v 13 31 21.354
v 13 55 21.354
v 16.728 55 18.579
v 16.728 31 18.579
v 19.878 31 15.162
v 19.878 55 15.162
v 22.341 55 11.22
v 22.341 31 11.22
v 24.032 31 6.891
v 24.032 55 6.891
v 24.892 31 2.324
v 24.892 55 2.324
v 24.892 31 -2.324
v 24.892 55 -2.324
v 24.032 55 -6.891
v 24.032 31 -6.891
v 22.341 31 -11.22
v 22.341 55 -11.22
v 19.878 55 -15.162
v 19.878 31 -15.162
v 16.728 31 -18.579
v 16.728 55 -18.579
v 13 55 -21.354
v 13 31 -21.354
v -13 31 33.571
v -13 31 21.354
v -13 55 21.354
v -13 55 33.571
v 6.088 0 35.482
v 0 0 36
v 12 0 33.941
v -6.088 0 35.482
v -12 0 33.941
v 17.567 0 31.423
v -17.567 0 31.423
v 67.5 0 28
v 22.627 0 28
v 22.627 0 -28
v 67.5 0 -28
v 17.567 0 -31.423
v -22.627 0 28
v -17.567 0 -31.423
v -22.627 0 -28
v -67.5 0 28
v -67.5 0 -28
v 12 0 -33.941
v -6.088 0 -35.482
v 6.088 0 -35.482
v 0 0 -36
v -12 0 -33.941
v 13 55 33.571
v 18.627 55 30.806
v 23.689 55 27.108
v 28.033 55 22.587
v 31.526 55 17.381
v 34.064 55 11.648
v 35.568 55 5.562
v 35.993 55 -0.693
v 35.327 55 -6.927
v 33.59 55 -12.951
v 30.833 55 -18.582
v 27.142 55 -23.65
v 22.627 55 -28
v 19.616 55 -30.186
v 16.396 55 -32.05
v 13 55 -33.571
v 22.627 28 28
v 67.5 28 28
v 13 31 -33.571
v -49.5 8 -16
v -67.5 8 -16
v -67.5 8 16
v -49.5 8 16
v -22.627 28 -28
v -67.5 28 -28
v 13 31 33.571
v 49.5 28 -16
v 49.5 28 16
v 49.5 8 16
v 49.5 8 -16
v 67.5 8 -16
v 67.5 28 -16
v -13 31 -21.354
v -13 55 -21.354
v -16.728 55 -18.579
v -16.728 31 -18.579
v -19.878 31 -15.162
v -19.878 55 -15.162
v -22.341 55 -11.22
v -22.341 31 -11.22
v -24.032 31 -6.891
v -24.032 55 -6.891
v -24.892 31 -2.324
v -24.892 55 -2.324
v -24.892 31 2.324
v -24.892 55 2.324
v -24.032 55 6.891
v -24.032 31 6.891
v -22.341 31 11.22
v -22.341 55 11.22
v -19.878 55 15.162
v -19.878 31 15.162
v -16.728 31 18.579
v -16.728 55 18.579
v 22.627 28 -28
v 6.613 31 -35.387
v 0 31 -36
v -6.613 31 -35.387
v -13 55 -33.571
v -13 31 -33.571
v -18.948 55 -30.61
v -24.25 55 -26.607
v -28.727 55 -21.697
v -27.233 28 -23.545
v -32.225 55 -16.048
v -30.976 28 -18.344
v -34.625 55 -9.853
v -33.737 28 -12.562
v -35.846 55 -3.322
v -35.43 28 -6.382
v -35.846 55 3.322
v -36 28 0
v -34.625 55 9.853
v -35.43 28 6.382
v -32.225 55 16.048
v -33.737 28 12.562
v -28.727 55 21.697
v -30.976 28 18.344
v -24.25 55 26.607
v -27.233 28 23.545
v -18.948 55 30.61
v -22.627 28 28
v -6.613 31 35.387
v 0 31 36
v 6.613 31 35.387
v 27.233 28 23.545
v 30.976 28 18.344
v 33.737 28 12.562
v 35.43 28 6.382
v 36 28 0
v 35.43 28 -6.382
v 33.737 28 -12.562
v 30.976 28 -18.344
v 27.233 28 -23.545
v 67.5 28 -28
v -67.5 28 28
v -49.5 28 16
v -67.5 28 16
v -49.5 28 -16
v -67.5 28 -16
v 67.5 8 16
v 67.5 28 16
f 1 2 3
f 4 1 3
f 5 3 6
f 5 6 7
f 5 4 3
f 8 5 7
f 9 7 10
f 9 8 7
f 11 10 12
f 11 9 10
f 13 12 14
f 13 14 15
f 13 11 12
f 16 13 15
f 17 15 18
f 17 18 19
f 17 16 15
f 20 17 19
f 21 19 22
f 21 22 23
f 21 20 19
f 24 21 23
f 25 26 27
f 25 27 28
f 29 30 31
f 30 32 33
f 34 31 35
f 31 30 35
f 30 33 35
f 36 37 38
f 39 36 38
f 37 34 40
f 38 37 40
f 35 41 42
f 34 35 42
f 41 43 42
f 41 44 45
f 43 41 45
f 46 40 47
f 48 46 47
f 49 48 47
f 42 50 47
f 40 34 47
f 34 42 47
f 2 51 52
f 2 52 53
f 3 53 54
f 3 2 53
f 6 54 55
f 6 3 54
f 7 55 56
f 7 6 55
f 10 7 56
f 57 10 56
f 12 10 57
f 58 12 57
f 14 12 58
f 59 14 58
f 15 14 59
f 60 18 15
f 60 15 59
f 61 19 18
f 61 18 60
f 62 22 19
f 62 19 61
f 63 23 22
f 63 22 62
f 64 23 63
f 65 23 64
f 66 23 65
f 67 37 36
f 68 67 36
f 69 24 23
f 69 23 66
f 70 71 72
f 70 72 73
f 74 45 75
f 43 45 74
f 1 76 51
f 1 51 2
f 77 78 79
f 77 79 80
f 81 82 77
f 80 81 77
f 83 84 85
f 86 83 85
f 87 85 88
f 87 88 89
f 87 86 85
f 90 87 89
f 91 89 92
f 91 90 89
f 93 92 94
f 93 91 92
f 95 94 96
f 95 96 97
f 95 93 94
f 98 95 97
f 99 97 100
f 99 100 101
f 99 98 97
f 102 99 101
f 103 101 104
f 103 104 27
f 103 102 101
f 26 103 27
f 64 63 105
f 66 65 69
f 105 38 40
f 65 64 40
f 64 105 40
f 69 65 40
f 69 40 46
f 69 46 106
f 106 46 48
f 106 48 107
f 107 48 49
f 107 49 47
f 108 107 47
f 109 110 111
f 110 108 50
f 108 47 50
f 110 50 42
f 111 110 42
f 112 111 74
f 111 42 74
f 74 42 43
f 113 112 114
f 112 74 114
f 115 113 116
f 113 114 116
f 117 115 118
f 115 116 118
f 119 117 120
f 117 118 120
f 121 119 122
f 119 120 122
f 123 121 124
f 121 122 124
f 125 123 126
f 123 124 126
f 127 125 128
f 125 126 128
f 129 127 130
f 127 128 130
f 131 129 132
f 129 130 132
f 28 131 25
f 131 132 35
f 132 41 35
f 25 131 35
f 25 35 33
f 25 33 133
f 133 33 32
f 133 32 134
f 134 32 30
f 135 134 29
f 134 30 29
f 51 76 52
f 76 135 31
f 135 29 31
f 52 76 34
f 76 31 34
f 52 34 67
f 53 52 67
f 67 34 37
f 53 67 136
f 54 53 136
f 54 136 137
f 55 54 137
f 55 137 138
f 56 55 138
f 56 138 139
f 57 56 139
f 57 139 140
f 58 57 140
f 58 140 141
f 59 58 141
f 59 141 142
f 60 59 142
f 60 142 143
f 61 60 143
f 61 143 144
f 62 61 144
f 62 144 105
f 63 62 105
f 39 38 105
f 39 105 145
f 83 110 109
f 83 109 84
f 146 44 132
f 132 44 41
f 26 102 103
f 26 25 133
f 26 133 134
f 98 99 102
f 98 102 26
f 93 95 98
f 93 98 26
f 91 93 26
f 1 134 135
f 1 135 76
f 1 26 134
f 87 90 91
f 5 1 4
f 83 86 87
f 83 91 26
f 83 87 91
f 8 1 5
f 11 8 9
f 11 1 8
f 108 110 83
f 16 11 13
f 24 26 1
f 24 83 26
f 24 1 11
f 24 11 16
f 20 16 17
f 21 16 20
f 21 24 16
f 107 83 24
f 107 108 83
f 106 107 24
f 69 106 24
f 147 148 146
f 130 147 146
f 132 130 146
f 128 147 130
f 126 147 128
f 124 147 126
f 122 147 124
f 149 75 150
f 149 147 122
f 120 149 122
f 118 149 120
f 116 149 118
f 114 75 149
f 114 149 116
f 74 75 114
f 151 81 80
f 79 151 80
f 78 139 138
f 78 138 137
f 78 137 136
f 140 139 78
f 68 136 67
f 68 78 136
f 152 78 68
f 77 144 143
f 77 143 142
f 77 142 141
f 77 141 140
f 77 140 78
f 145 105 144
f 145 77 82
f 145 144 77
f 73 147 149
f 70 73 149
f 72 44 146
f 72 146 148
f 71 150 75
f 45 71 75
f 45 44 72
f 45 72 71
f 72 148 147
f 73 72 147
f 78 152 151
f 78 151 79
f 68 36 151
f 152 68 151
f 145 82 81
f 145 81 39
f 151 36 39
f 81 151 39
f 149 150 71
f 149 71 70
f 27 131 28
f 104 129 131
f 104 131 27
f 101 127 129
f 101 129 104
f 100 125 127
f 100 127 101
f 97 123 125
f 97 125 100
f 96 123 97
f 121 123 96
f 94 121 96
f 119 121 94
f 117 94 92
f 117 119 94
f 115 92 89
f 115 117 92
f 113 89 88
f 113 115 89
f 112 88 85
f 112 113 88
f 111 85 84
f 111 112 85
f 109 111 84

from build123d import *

# Parameters (mm, degrees)
SKETCH1_W           = 135
SKETCH1_H           = 56
BOSS_EXTRUDE1_DEPTH = 28
SKETCH2_R           = 36
BOSS_EXTRUDE2_DEPTH = 55
SKETCH3_W           = 18
SKETCH3_H           = 32
CUT_EXTRUDE1_DEPTH  = 20
CUT_EXTRUDE2_START  = -24
CUT_EXTRUDE2_DEPTH  = 24


with BuildPart() as part:
    # Sketch1 → Boss-Extrude1 (new body)
    with BuildSketch(Plane(origin=(0, 0, 0), x_dir=(1, 0, 0), z_dir=(0, 1, 0))):
        Rectangle(SKETCH1_W, SKETCH1_H)
    extrude(amount=BOSS_EXTRUDE1_DEPTH)

    # Sketch2 → Boss-Extrude2 (add)
    with BuildSketch(Plane(origin=(0, 0, 0), x_dir=(1, 0, 0), z_dir=(0, 1, 0))):
        with Locations(Location((0, 0, 0), (0, 0, 51.057558731))):
            Circle(SKETCH2_R)
    extrude(amount=BOSS_EXTRUDE2_DEPTH)

    # Sketch3 → Cut-Extrude1 (cut)
    with BuildSketch(Plane(origin=(0, 28, 0), x_dir=(1, 0, 0), z_dir=(0, 1, 0))):
        with Locations((-58.5, 0)):
            Rectangle(SKETCH3_W, SKETCH3_H)
    cut_extrude1 = extrude(amount=-CUT_EXTRUDE1_DEPTH, mode=Mode.SUBTRACT)

    # Mirror1: Cut-Extrude1 across plane
    add(cut_extrude1.mirror(Plane(origin=(0, 0, 0), x_dir=(0, 0, 1), z_dir=(1, 0, 0))), mode=Mode.SUBTRACT)

    # Sketch4 → Cut-Extrude2 (cut)
    with BuildSketch(Plane(origin=(0, 55, 0), x_dir=(1, 0, 0), z_dir=(0, 1, 0)).offset(CUT_EXTRUDE2_START)):
        with BuildLine():
            Line((-13, 33.570820663), (-13, 21.354156504))
            ThreePointArc((-13, 21.354156504), (-25, 0), (-13, -21.354156504))
            Line((-13, -21.354156504), (-13, -33.570820663))
            ThreePointArc((-13, -33.570820663), (0, -36), (13, -33.570820663))
            Line((13, -33.570820663), (13, -21.354156504))
            ThreePointArc((13, -21.354156504), (25, 0), (13, 21.354156504))
            Line((13, 21.354156504), (13, 33.570820663))
            ThreePointArc((13, 33.570820663), (0, 36), (-13, 33.570820663))
        make_face()
    extrude(amount=CUT_EXTRUDE2_DEPTH, mode=Mode.SUBTRACT)


solid = part.part
